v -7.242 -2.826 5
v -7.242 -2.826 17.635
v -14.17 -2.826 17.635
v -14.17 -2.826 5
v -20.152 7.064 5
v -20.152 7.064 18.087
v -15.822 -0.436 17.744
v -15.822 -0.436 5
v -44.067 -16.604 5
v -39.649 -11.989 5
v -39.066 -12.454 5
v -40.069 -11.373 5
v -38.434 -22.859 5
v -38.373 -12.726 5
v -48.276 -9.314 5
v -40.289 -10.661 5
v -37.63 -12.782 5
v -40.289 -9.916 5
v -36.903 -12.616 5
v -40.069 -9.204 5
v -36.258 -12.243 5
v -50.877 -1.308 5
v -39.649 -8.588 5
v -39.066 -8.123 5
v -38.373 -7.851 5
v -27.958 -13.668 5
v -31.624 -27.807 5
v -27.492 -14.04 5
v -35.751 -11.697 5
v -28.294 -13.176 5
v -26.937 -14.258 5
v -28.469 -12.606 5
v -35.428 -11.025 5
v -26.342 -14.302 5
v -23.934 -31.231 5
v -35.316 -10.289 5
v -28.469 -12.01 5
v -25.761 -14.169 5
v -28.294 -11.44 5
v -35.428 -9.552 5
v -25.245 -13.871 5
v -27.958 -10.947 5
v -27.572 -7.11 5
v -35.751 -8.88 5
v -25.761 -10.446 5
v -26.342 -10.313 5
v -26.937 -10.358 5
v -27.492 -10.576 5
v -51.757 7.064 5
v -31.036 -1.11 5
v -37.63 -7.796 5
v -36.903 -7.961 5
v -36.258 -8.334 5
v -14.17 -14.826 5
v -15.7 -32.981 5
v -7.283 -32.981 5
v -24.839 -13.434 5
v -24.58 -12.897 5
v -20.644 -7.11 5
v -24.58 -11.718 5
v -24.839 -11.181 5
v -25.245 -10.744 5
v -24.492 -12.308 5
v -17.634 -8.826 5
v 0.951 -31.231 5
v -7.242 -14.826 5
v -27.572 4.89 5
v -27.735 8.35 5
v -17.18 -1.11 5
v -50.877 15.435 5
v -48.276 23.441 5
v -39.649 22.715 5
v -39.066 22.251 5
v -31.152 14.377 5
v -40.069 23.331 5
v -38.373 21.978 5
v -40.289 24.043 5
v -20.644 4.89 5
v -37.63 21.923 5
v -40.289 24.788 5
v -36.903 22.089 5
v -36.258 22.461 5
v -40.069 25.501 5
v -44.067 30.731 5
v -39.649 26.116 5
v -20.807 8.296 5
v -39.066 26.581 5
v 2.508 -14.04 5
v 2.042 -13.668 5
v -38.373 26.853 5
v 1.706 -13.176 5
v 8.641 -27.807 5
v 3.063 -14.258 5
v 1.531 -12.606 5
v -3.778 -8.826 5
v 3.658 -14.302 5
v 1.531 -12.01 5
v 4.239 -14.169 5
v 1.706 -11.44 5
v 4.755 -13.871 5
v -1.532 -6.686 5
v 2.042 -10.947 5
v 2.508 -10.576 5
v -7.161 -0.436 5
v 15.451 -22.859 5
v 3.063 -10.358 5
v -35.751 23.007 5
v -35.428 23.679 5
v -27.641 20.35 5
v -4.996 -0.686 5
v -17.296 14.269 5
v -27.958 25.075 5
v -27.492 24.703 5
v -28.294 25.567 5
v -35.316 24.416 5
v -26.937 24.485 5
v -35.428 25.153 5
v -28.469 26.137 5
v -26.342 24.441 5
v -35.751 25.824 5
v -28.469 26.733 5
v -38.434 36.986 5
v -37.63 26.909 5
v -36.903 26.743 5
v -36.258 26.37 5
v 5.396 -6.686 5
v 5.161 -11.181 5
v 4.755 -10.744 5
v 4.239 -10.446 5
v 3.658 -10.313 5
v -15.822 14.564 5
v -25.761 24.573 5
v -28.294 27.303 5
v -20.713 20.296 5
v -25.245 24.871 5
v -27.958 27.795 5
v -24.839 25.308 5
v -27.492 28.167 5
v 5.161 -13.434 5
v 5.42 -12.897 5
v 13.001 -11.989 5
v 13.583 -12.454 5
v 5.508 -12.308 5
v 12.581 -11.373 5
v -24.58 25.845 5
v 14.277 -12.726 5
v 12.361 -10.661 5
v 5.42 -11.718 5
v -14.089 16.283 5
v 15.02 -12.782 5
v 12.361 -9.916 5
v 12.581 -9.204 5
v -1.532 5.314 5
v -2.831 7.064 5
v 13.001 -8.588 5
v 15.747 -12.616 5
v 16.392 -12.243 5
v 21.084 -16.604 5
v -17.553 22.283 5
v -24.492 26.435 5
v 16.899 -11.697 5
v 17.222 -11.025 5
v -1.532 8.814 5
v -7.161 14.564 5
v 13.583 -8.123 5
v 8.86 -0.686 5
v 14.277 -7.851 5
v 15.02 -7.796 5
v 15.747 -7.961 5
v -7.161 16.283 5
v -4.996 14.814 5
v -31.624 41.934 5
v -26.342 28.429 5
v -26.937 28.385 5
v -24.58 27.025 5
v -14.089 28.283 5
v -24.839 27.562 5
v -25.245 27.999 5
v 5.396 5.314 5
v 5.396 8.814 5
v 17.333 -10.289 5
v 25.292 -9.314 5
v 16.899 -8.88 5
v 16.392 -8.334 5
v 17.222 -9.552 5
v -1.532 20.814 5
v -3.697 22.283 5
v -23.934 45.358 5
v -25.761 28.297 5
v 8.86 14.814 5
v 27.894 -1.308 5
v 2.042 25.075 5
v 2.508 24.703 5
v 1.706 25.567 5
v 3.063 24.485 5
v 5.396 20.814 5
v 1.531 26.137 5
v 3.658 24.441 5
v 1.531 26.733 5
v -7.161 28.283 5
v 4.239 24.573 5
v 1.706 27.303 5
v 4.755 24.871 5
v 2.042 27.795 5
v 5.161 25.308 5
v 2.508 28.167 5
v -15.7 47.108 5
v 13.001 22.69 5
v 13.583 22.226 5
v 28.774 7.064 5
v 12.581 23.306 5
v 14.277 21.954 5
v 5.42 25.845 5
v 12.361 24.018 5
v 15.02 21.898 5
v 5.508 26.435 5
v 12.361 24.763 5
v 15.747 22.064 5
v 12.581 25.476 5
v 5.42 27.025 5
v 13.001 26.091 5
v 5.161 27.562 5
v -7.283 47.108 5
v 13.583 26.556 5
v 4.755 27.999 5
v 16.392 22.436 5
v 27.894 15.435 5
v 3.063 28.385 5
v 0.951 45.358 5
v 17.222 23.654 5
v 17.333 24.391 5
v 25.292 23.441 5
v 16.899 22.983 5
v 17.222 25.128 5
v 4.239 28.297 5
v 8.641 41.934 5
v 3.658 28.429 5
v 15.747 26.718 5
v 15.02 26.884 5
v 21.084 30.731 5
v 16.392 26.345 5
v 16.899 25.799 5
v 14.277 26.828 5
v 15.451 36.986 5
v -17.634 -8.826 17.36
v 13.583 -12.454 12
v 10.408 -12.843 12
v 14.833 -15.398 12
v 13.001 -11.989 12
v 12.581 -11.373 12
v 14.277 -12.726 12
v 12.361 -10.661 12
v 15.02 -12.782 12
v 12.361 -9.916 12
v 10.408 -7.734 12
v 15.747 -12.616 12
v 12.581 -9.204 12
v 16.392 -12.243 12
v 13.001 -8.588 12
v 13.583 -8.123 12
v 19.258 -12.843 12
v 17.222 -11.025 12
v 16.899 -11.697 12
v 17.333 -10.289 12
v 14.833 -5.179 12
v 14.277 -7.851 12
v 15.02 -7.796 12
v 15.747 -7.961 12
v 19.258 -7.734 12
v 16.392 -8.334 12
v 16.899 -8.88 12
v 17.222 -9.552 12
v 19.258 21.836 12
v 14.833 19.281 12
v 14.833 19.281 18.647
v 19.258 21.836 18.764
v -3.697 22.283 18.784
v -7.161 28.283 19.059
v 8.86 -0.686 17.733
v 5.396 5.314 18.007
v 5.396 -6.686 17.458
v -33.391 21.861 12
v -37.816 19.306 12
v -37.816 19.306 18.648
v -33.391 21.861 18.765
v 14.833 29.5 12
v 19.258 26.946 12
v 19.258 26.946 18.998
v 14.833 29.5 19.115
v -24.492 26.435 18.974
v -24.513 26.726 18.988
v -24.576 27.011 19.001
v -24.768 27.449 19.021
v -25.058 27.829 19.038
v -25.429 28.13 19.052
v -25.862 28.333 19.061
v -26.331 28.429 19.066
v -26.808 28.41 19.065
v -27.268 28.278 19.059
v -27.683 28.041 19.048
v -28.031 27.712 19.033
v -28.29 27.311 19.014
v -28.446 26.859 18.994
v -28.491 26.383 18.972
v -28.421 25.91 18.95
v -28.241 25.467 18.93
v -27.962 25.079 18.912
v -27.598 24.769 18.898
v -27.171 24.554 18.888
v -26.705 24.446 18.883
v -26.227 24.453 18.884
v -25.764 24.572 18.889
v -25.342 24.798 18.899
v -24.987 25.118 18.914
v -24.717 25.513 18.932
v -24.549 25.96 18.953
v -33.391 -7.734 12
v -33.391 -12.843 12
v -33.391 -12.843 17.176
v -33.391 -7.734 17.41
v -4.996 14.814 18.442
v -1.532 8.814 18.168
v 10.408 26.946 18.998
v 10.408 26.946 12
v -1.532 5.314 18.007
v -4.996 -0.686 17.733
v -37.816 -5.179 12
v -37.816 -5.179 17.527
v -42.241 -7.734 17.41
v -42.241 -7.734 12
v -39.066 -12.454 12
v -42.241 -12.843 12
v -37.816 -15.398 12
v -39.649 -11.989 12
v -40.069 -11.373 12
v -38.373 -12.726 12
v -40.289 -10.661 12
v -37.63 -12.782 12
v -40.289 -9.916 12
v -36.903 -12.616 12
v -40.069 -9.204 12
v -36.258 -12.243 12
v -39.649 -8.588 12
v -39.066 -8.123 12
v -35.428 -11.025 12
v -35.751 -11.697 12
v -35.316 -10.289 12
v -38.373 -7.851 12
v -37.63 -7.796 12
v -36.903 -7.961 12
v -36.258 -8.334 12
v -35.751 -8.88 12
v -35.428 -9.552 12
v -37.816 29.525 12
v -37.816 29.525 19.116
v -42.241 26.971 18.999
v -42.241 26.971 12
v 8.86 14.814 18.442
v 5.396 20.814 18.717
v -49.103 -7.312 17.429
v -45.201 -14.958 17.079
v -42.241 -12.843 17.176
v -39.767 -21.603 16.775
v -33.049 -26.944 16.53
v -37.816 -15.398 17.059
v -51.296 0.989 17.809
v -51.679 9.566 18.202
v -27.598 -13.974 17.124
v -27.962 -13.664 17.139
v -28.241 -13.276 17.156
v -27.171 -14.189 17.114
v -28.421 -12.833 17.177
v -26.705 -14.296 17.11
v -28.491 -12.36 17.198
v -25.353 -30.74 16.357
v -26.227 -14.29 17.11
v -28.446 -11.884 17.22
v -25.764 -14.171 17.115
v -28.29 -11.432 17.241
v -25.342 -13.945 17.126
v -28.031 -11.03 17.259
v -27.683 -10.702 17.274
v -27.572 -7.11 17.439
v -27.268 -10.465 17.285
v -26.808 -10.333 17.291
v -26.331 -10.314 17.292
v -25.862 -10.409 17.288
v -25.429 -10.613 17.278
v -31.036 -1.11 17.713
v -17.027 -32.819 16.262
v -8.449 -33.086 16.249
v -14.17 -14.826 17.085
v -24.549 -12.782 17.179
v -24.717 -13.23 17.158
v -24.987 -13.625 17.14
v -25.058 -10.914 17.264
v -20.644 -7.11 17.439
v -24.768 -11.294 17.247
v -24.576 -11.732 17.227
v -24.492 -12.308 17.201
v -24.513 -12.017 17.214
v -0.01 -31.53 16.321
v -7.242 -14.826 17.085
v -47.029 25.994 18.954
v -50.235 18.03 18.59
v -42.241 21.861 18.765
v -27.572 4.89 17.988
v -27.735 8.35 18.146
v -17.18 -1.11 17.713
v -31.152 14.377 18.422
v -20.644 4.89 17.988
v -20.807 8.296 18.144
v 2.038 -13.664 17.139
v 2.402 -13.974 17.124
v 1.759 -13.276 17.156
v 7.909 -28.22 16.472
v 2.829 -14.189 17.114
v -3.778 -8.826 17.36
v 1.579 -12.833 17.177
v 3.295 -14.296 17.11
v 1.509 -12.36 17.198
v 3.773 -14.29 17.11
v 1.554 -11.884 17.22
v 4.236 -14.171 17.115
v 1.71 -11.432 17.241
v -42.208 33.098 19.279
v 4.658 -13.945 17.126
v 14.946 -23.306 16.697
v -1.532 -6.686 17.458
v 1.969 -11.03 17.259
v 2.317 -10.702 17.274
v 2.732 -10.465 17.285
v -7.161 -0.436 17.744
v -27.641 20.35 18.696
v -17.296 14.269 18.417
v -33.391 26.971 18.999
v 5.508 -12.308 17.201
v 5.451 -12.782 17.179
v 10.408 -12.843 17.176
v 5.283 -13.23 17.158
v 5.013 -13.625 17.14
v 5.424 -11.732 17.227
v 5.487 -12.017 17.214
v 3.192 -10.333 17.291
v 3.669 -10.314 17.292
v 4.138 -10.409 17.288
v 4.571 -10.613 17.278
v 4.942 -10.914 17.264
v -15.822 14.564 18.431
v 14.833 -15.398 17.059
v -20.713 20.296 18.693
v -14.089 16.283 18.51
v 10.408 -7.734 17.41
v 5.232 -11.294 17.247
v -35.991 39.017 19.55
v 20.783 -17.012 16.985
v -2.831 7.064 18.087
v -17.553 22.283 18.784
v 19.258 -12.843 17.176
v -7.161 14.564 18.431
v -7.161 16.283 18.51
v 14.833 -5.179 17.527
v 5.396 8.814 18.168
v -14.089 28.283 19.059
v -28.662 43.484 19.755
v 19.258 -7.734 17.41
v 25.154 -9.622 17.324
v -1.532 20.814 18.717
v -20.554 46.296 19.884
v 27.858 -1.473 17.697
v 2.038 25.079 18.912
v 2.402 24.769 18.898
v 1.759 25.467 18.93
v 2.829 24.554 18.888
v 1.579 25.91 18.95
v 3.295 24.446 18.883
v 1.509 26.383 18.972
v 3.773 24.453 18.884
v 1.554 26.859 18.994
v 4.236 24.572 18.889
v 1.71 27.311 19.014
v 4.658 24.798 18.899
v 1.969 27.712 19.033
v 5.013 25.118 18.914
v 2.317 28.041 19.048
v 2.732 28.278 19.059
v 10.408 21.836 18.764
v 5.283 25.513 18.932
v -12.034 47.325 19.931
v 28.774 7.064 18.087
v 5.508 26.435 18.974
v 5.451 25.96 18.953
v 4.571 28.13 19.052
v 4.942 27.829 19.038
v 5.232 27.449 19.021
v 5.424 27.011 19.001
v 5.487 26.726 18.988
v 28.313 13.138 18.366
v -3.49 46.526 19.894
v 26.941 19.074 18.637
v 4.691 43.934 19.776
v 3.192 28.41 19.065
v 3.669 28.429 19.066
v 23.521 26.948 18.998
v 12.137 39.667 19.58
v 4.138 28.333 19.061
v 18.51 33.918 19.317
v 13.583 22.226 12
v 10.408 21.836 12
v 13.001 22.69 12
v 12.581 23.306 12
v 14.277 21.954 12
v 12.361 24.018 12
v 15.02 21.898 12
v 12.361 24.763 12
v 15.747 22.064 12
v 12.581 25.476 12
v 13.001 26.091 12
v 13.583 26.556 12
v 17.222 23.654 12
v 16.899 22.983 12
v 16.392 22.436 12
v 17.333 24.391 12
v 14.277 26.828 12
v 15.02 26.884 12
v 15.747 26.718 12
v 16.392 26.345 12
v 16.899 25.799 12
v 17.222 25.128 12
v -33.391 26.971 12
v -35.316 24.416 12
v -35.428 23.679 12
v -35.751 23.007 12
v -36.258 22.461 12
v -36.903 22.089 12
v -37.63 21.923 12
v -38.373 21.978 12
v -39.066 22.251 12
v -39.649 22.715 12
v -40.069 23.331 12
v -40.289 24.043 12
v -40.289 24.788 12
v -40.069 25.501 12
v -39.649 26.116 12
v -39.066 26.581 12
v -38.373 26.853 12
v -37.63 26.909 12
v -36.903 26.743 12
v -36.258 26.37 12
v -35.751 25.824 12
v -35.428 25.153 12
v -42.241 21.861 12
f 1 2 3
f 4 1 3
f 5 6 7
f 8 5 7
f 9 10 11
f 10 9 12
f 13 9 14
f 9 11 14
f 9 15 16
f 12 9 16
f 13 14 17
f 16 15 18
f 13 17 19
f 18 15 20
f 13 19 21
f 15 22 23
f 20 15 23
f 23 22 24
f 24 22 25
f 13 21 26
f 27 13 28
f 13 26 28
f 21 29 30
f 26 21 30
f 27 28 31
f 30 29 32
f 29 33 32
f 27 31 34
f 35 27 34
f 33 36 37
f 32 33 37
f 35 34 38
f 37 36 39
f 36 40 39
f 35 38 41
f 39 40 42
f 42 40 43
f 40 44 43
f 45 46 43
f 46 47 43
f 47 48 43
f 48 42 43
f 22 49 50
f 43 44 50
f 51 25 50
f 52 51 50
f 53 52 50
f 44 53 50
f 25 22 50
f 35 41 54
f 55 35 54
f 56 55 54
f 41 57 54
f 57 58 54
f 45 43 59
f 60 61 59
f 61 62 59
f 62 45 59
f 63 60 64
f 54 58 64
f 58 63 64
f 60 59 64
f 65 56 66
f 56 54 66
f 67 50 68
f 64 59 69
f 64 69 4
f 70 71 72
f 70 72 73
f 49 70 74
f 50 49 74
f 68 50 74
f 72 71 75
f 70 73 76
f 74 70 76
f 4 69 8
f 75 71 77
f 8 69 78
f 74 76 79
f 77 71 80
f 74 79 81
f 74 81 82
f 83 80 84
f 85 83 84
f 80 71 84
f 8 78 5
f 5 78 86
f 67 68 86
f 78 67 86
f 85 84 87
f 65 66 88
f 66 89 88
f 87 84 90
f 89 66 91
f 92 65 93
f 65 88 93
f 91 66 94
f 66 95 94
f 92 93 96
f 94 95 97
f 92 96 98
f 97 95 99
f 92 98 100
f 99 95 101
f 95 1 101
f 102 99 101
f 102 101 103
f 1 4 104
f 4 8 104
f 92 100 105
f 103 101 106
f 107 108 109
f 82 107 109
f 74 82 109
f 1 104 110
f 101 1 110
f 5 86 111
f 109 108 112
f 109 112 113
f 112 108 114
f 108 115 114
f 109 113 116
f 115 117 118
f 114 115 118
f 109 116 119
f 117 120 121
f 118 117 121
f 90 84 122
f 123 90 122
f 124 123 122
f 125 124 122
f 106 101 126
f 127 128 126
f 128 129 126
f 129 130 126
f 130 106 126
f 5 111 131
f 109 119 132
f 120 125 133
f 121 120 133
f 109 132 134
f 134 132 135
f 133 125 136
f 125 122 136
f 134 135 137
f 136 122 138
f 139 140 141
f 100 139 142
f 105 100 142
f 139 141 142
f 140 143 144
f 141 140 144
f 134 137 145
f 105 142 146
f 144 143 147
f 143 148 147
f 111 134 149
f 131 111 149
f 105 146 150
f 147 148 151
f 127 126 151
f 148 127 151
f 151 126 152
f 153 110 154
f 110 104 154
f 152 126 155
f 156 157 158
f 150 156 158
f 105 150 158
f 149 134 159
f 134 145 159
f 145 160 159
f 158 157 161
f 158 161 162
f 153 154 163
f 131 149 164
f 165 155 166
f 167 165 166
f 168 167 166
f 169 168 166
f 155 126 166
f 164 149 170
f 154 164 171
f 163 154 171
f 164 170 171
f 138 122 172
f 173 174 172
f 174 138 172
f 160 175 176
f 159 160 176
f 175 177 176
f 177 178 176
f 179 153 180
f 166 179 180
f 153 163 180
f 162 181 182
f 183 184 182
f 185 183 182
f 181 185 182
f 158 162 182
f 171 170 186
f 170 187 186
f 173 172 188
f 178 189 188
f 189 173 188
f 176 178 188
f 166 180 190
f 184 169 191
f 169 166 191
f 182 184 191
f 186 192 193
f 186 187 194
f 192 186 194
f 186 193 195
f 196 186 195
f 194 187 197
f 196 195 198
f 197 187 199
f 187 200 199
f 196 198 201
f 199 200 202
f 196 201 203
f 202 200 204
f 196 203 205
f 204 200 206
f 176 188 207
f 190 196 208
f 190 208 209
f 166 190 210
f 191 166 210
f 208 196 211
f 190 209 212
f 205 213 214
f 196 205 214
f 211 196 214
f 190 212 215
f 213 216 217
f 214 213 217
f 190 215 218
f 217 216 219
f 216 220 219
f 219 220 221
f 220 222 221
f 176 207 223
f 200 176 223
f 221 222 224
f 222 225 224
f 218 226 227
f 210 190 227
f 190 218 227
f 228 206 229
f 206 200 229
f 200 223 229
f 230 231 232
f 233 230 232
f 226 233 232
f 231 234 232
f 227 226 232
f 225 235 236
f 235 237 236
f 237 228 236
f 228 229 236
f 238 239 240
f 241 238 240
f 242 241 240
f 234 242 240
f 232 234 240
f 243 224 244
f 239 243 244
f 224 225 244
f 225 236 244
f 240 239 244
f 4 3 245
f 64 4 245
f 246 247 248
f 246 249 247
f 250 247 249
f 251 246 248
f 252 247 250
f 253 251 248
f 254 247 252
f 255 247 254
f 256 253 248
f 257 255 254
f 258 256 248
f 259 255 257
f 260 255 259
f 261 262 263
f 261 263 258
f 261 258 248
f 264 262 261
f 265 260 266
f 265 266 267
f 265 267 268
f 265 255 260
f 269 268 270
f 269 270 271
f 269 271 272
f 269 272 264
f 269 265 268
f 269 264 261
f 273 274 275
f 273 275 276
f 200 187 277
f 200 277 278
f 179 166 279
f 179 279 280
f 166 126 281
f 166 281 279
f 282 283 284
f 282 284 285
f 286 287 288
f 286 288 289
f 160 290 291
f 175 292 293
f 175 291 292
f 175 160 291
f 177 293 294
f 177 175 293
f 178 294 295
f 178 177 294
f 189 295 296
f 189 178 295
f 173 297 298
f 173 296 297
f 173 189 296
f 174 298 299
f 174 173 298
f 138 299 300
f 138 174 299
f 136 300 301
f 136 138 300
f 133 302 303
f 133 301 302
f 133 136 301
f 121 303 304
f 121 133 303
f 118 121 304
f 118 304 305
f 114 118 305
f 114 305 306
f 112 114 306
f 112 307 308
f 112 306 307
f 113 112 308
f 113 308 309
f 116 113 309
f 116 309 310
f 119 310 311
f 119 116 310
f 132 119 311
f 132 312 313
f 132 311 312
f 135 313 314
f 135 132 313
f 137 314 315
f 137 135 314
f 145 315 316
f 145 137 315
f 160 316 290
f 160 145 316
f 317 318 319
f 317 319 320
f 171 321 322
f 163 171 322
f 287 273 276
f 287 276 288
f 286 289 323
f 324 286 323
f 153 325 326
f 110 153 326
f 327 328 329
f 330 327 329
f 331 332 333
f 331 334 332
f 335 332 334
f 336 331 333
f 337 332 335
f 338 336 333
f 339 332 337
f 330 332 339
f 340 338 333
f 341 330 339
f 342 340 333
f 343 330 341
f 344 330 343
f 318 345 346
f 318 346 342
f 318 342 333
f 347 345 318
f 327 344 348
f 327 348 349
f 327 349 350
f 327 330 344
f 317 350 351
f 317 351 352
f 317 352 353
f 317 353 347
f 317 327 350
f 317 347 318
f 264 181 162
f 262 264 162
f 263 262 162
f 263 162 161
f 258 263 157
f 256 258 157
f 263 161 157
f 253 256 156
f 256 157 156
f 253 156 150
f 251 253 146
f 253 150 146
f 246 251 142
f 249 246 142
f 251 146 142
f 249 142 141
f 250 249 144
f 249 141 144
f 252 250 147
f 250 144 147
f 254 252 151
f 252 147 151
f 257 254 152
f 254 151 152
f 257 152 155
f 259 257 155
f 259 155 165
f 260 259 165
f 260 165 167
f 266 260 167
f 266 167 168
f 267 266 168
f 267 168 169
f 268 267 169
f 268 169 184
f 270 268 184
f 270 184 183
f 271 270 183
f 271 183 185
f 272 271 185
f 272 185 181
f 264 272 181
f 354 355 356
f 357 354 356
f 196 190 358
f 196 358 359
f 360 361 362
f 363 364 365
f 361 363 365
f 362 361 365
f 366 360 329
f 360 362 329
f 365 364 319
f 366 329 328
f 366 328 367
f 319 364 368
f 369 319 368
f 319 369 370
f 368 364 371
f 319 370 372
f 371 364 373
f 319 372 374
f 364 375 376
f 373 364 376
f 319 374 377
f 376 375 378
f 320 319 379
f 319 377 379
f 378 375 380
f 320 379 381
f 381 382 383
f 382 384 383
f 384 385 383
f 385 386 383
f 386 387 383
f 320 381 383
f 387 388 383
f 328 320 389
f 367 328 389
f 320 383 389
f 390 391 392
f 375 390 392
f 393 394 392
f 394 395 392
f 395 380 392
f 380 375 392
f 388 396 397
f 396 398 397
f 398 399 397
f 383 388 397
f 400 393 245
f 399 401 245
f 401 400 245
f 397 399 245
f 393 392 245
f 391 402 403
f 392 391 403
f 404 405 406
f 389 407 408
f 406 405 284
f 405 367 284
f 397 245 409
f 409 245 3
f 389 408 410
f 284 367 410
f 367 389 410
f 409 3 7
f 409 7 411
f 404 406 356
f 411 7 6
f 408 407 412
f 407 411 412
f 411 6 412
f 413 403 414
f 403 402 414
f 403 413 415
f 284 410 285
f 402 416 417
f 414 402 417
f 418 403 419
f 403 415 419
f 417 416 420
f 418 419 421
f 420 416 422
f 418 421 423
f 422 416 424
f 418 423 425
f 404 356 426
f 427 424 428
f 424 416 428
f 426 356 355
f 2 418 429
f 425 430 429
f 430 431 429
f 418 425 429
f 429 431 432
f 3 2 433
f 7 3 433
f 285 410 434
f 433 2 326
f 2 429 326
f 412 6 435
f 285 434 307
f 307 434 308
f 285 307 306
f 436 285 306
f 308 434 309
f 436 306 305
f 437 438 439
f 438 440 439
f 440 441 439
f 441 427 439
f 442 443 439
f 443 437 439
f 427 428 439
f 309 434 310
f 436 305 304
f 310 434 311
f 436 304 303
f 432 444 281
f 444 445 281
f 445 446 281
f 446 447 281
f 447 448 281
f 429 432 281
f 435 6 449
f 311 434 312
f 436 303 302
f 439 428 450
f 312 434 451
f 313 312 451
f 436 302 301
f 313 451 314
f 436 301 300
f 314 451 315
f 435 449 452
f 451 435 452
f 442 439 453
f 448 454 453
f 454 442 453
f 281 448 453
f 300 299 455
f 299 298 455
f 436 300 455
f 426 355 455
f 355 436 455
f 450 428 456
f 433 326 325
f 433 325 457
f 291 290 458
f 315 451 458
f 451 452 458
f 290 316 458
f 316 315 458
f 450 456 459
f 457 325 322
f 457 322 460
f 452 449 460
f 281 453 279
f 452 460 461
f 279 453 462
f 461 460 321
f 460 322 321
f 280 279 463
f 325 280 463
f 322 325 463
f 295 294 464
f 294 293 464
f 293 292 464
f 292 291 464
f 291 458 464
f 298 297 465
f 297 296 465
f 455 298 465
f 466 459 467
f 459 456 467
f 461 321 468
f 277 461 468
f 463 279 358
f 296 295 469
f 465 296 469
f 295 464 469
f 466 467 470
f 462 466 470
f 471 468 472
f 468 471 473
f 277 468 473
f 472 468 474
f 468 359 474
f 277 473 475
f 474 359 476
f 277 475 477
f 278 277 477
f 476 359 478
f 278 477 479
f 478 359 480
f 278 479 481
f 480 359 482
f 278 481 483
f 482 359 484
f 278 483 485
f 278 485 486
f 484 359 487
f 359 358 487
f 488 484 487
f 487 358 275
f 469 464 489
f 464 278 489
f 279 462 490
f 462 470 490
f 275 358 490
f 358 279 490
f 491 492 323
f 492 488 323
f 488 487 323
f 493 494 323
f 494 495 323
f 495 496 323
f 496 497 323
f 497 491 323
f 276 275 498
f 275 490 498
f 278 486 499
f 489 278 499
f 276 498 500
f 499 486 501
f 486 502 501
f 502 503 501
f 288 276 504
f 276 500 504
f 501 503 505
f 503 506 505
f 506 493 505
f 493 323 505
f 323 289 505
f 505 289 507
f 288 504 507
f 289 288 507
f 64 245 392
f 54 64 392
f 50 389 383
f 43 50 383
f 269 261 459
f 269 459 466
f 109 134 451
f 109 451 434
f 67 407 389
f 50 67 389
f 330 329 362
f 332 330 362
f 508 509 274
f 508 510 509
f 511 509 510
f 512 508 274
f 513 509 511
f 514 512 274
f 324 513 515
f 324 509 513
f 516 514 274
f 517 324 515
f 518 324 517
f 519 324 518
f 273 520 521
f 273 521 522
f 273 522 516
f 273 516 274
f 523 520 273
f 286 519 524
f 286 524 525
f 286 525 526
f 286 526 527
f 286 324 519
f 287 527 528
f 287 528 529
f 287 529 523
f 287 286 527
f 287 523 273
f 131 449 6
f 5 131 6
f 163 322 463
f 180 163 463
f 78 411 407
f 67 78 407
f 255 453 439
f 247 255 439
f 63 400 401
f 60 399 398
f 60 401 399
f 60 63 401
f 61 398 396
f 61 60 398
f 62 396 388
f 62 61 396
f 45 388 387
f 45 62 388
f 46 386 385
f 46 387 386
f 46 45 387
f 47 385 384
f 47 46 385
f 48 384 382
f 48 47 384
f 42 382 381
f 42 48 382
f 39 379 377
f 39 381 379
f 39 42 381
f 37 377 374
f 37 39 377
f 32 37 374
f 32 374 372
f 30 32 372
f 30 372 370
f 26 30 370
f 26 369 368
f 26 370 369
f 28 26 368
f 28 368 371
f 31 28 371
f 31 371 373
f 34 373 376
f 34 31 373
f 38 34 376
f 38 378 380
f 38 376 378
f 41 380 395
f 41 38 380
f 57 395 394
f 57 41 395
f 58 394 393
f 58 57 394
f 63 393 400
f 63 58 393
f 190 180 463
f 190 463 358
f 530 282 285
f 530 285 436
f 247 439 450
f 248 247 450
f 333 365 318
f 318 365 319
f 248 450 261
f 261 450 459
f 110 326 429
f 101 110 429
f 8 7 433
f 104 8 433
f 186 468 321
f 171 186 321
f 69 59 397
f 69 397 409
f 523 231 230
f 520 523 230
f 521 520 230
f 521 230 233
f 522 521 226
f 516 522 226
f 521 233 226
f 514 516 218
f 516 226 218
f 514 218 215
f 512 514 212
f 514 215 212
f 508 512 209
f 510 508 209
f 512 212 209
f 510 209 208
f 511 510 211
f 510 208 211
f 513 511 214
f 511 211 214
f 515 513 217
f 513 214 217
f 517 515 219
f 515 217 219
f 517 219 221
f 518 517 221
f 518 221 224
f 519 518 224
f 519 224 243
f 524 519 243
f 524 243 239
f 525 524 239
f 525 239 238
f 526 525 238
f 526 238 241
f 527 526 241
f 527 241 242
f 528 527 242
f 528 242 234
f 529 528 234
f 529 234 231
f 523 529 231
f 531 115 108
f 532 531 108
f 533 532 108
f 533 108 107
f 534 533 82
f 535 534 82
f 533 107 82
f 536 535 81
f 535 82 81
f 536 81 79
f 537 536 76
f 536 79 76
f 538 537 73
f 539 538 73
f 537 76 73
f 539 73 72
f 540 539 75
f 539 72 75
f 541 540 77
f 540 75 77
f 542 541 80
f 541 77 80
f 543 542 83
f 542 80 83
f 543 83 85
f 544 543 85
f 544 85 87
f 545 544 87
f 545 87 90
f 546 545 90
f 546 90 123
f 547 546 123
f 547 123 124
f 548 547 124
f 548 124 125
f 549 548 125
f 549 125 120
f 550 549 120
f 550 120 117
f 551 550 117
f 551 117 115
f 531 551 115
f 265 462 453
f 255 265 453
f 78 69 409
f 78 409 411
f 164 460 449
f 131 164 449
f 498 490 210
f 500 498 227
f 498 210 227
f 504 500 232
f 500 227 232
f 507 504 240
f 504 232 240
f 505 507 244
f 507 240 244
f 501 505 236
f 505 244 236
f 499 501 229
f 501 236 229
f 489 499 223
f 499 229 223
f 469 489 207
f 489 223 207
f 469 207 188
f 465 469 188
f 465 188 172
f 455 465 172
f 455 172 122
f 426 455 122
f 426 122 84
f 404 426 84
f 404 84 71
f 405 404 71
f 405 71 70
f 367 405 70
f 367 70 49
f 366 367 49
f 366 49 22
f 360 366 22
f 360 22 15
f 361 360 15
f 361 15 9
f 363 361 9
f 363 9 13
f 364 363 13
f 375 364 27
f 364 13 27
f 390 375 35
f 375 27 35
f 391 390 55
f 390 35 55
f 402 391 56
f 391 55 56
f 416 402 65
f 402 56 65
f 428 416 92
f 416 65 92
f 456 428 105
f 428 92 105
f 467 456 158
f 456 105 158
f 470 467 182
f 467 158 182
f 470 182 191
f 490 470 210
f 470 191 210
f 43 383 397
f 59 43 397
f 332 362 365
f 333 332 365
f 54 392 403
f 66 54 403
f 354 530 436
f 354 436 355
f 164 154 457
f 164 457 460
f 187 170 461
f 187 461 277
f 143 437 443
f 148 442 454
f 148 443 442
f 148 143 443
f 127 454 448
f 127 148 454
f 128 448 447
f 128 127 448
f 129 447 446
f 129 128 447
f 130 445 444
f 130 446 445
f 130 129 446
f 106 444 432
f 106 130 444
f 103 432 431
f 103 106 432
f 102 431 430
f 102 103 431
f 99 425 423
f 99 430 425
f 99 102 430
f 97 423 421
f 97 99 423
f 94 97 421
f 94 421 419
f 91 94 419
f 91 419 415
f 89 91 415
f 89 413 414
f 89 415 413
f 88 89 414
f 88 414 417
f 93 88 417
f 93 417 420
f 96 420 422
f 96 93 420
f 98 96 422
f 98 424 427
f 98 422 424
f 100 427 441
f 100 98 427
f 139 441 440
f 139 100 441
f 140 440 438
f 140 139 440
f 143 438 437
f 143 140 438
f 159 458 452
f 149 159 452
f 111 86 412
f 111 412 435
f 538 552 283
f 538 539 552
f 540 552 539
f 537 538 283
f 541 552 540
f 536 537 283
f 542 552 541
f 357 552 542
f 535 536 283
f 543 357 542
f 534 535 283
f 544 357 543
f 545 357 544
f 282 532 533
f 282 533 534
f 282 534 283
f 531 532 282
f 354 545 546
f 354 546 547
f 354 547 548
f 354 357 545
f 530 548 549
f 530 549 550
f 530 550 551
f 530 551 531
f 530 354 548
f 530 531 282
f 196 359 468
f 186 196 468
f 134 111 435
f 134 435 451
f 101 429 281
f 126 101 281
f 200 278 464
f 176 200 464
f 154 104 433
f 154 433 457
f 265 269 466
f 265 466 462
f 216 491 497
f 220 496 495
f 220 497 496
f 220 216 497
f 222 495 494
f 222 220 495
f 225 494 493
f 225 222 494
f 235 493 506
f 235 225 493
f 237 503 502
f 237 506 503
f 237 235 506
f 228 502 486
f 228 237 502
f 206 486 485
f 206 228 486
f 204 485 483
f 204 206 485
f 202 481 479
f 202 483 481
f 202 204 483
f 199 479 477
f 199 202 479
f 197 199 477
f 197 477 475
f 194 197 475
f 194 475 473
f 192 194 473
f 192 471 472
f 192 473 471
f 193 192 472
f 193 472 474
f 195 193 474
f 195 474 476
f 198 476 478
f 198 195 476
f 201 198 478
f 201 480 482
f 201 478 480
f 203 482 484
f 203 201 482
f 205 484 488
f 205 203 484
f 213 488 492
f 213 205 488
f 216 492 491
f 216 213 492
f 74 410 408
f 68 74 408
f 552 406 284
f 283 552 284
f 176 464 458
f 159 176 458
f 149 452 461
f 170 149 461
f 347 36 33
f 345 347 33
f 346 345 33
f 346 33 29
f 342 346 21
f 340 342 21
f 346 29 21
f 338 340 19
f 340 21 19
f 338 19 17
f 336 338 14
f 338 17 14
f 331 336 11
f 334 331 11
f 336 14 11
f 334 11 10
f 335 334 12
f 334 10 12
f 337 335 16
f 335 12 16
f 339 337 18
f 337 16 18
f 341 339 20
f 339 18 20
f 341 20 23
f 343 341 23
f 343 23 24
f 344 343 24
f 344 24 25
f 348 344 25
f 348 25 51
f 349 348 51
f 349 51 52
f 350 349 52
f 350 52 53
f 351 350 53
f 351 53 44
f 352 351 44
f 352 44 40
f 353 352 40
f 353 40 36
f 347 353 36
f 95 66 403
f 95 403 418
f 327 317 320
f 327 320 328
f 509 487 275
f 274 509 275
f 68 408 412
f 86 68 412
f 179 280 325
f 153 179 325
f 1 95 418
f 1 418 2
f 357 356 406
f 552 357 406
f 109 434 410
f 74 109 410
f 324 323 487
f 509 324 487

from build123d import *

# Parameters (mm, degrees)
F0_R      = 40.2650795079
F0_R_2    = 2
F2_DEPTH  = 20
F4_DEPTH  = 69.8
F6_DEPTH  = 25.001
F7_DEPTH  = 5
F8_R      = 2.5
F9_DEPTH  = 14.9319422489
F11_DEPTH = 13


# Not quite as in the source:
# - a feature names something its author has since deleted; it is built from what else it names


with BuildPart() as f2:
    # F0 (on Top) → F2 (new body)
    with BuildSketch(Plane.XY):
        with Locations((-11.4915669638, 7.0636273592)):
            Circle(F0_R)
        with Locations((-26.4915669638, -12.3077432686)):
            Circle(F0_R_2, mode=Mode.SUBTRACT)
        with Locations((3.5084330362, -12.3077432686)):
            Circle(F0_R_2, mode=Mode.SUBTRACT)
        with Locations((-26.4915669638, 26.434997987)):
            Circle(F0_R_2, mode=Mode.SUBTRACT)
        with Locations((3.5084330362, 26.434997987)):
            Circle(F0_R_2, mode=Mode.SUBTRACT)
    extrude(amount=F2_DEPTH)

    # F3 (on Right) → F4 (cut, symmetric)
    with BuildSketch(Plane.YZ):
        Polygon((-43.8041239977, 30.4956686149), (-39.6489202976, 15.9488338977), (68.1266114116, 20.8831354976), (67.6865195207, 30.4956686149), align=None)
    extrude(amount=F4_DEPTH, both=True, mode=Mode.SUBTRACT)

    # F5 (on offset) → F6 (cut, through all)
    with BuildSketch(Plane.XY.offset(25)):
        Polygon((-4.9963764354, 14.8136273592), (-1.5322748203, 8.8136273592), (5.39592841, 8.8136273592), (8.8600300251, 14.8136273592), (5.39592841, 20.8136273592), (-1.5322748203, 20.8136273592), align=None)
        Polygon((-1.5322748203, 5.3136273592), (-4.9963764354, -0.6863726408), (-1.5322748203, -6.6863726408), (5.39592841, -6.6863726408), (8.8600300251, -0.6863726408), (5.39592841, 5.3136273592), align=None)
        Polygon((-14.170220135, -2.8258145228), (-17.6343217501, -8.8258145228), (-14.170220135, -14.8258145228), (-7.2420169047, -14.8258145228), (-3.7779152896, -8.8258145228), (-7.2420169047, -2.8258145228), align=None)
        Polygon((-27.5721969216, 4.890474733), (-31.0362985367, -1.109525267), (-27.5721969216, -7.109525267), (-20.6439936913, -7.109525267), (-17.1798920761, -1.109525267), (-20.6439936913, 4.890474733), align=None)
        Polygon((-7.1614399449, 14.5636273592), (-15.8216939827, 14.5636273592), (-20.1518210017, 7.0636273592), (-15.8216939827, -0.4363726408), (-7.1614399449, -0.4363726408), (-2.831312926, 7.0636273592), align=None)
        Polygon((-27.6414862443, 20.3495556396), (-31.1520113303, 14.3765987822), (-27.7345414991, 8.3499164484), (-20.8065465819, 8.296190972), (-17.2960214958, 14.2691478294), (-20.7134913271, 20.2958301632), align=None)
        Polygon((-14.0889966993, 28.28301467), (-17.5530983144, 22.28301467), (-14.0889966993, 16.28301467), (-7.160793469, 16.28301467), (-3.6966918539, 22.28301467), (-7.160793469, 28.28301467), align=None)
    extrude(amount=-F6_DEPTH, mode=Mode.SUBTRACT)

    # F7 (cut): a face of the model
    f7_faces = [f2.faces().sort_by_distance(p)[0] for p in [
        (-50.6177780411, 7.0636273592, 0),
    ]]
    extrude(f7_faces, amount=-F7_DEPTH, mode=Mode.SUBTRACT)

    # F8 (on face) → F9 (cut, through all)
    with BuildSketch(Plane(origin=(0, 0, 5), x_dir=(1, 0, 0), z_dir=(0, 0, -1))):
        with Locations((14.8332985118, 10.2885384113)):
            Circle(F8_R)
        with Locations((14.8332985118, -24.3908837438)):
            Circle(F8_R)
        with Locations((-37.8164324394, -24.4157931297)):
            Circle(F8_R)
        with Locations((-37.8164324394, 10.2885384113)):
            Circle(F8_R)
    extrude(amount=-F9_DEPTH, mode=Mode.SUBTRACT)

    # F10 (on offset) → F11 (cut)
    with BuildSketch(Plane.XY.offset(25)):
        Polygon((19.2582985118, -12.8433133524), (19.2582985118, -7.7337634701), (14.8332985118, -5.1789885289), (10.4082985118, -7.7337634701), (10.4082985118, -12.8433133524), (14.8332985118, -15.3980882936), align=None)
        Polygon((19.2582985118, 21.8361088026), (19.2582985118, 26.9456586849), (14.8332985118, 29.5004336261), (10.4082985118, 26.9456586849), (10.4082985118, 21.8361088026), (14.8332985118, 19.2813338614), align=None)
        Polygon((-33.3914324394, 21.8610181886), (-33.3914324394, 26.9705680709), (-37.8164324394, 29.5253430121), (-42.2414324394, 26.9705680709), (-42.2414324394, 21.8610181886), (-37.8164324394, 19.3062432474), align=None)
        Polygon((-33.3914324394, -12.8433133524), (-33.3914324394, -7.7337634701), (-37.8164324394, -5.1789885289), (-42.2414324394, -7.7337634701), (-42.2414324394, -12.8433133524), (-37.8164324394, -15.3980882936), align=None)
    extrude(amount=-F11_DEPTH, mode=Mode.SUBTRACT)


solid = f2.part
